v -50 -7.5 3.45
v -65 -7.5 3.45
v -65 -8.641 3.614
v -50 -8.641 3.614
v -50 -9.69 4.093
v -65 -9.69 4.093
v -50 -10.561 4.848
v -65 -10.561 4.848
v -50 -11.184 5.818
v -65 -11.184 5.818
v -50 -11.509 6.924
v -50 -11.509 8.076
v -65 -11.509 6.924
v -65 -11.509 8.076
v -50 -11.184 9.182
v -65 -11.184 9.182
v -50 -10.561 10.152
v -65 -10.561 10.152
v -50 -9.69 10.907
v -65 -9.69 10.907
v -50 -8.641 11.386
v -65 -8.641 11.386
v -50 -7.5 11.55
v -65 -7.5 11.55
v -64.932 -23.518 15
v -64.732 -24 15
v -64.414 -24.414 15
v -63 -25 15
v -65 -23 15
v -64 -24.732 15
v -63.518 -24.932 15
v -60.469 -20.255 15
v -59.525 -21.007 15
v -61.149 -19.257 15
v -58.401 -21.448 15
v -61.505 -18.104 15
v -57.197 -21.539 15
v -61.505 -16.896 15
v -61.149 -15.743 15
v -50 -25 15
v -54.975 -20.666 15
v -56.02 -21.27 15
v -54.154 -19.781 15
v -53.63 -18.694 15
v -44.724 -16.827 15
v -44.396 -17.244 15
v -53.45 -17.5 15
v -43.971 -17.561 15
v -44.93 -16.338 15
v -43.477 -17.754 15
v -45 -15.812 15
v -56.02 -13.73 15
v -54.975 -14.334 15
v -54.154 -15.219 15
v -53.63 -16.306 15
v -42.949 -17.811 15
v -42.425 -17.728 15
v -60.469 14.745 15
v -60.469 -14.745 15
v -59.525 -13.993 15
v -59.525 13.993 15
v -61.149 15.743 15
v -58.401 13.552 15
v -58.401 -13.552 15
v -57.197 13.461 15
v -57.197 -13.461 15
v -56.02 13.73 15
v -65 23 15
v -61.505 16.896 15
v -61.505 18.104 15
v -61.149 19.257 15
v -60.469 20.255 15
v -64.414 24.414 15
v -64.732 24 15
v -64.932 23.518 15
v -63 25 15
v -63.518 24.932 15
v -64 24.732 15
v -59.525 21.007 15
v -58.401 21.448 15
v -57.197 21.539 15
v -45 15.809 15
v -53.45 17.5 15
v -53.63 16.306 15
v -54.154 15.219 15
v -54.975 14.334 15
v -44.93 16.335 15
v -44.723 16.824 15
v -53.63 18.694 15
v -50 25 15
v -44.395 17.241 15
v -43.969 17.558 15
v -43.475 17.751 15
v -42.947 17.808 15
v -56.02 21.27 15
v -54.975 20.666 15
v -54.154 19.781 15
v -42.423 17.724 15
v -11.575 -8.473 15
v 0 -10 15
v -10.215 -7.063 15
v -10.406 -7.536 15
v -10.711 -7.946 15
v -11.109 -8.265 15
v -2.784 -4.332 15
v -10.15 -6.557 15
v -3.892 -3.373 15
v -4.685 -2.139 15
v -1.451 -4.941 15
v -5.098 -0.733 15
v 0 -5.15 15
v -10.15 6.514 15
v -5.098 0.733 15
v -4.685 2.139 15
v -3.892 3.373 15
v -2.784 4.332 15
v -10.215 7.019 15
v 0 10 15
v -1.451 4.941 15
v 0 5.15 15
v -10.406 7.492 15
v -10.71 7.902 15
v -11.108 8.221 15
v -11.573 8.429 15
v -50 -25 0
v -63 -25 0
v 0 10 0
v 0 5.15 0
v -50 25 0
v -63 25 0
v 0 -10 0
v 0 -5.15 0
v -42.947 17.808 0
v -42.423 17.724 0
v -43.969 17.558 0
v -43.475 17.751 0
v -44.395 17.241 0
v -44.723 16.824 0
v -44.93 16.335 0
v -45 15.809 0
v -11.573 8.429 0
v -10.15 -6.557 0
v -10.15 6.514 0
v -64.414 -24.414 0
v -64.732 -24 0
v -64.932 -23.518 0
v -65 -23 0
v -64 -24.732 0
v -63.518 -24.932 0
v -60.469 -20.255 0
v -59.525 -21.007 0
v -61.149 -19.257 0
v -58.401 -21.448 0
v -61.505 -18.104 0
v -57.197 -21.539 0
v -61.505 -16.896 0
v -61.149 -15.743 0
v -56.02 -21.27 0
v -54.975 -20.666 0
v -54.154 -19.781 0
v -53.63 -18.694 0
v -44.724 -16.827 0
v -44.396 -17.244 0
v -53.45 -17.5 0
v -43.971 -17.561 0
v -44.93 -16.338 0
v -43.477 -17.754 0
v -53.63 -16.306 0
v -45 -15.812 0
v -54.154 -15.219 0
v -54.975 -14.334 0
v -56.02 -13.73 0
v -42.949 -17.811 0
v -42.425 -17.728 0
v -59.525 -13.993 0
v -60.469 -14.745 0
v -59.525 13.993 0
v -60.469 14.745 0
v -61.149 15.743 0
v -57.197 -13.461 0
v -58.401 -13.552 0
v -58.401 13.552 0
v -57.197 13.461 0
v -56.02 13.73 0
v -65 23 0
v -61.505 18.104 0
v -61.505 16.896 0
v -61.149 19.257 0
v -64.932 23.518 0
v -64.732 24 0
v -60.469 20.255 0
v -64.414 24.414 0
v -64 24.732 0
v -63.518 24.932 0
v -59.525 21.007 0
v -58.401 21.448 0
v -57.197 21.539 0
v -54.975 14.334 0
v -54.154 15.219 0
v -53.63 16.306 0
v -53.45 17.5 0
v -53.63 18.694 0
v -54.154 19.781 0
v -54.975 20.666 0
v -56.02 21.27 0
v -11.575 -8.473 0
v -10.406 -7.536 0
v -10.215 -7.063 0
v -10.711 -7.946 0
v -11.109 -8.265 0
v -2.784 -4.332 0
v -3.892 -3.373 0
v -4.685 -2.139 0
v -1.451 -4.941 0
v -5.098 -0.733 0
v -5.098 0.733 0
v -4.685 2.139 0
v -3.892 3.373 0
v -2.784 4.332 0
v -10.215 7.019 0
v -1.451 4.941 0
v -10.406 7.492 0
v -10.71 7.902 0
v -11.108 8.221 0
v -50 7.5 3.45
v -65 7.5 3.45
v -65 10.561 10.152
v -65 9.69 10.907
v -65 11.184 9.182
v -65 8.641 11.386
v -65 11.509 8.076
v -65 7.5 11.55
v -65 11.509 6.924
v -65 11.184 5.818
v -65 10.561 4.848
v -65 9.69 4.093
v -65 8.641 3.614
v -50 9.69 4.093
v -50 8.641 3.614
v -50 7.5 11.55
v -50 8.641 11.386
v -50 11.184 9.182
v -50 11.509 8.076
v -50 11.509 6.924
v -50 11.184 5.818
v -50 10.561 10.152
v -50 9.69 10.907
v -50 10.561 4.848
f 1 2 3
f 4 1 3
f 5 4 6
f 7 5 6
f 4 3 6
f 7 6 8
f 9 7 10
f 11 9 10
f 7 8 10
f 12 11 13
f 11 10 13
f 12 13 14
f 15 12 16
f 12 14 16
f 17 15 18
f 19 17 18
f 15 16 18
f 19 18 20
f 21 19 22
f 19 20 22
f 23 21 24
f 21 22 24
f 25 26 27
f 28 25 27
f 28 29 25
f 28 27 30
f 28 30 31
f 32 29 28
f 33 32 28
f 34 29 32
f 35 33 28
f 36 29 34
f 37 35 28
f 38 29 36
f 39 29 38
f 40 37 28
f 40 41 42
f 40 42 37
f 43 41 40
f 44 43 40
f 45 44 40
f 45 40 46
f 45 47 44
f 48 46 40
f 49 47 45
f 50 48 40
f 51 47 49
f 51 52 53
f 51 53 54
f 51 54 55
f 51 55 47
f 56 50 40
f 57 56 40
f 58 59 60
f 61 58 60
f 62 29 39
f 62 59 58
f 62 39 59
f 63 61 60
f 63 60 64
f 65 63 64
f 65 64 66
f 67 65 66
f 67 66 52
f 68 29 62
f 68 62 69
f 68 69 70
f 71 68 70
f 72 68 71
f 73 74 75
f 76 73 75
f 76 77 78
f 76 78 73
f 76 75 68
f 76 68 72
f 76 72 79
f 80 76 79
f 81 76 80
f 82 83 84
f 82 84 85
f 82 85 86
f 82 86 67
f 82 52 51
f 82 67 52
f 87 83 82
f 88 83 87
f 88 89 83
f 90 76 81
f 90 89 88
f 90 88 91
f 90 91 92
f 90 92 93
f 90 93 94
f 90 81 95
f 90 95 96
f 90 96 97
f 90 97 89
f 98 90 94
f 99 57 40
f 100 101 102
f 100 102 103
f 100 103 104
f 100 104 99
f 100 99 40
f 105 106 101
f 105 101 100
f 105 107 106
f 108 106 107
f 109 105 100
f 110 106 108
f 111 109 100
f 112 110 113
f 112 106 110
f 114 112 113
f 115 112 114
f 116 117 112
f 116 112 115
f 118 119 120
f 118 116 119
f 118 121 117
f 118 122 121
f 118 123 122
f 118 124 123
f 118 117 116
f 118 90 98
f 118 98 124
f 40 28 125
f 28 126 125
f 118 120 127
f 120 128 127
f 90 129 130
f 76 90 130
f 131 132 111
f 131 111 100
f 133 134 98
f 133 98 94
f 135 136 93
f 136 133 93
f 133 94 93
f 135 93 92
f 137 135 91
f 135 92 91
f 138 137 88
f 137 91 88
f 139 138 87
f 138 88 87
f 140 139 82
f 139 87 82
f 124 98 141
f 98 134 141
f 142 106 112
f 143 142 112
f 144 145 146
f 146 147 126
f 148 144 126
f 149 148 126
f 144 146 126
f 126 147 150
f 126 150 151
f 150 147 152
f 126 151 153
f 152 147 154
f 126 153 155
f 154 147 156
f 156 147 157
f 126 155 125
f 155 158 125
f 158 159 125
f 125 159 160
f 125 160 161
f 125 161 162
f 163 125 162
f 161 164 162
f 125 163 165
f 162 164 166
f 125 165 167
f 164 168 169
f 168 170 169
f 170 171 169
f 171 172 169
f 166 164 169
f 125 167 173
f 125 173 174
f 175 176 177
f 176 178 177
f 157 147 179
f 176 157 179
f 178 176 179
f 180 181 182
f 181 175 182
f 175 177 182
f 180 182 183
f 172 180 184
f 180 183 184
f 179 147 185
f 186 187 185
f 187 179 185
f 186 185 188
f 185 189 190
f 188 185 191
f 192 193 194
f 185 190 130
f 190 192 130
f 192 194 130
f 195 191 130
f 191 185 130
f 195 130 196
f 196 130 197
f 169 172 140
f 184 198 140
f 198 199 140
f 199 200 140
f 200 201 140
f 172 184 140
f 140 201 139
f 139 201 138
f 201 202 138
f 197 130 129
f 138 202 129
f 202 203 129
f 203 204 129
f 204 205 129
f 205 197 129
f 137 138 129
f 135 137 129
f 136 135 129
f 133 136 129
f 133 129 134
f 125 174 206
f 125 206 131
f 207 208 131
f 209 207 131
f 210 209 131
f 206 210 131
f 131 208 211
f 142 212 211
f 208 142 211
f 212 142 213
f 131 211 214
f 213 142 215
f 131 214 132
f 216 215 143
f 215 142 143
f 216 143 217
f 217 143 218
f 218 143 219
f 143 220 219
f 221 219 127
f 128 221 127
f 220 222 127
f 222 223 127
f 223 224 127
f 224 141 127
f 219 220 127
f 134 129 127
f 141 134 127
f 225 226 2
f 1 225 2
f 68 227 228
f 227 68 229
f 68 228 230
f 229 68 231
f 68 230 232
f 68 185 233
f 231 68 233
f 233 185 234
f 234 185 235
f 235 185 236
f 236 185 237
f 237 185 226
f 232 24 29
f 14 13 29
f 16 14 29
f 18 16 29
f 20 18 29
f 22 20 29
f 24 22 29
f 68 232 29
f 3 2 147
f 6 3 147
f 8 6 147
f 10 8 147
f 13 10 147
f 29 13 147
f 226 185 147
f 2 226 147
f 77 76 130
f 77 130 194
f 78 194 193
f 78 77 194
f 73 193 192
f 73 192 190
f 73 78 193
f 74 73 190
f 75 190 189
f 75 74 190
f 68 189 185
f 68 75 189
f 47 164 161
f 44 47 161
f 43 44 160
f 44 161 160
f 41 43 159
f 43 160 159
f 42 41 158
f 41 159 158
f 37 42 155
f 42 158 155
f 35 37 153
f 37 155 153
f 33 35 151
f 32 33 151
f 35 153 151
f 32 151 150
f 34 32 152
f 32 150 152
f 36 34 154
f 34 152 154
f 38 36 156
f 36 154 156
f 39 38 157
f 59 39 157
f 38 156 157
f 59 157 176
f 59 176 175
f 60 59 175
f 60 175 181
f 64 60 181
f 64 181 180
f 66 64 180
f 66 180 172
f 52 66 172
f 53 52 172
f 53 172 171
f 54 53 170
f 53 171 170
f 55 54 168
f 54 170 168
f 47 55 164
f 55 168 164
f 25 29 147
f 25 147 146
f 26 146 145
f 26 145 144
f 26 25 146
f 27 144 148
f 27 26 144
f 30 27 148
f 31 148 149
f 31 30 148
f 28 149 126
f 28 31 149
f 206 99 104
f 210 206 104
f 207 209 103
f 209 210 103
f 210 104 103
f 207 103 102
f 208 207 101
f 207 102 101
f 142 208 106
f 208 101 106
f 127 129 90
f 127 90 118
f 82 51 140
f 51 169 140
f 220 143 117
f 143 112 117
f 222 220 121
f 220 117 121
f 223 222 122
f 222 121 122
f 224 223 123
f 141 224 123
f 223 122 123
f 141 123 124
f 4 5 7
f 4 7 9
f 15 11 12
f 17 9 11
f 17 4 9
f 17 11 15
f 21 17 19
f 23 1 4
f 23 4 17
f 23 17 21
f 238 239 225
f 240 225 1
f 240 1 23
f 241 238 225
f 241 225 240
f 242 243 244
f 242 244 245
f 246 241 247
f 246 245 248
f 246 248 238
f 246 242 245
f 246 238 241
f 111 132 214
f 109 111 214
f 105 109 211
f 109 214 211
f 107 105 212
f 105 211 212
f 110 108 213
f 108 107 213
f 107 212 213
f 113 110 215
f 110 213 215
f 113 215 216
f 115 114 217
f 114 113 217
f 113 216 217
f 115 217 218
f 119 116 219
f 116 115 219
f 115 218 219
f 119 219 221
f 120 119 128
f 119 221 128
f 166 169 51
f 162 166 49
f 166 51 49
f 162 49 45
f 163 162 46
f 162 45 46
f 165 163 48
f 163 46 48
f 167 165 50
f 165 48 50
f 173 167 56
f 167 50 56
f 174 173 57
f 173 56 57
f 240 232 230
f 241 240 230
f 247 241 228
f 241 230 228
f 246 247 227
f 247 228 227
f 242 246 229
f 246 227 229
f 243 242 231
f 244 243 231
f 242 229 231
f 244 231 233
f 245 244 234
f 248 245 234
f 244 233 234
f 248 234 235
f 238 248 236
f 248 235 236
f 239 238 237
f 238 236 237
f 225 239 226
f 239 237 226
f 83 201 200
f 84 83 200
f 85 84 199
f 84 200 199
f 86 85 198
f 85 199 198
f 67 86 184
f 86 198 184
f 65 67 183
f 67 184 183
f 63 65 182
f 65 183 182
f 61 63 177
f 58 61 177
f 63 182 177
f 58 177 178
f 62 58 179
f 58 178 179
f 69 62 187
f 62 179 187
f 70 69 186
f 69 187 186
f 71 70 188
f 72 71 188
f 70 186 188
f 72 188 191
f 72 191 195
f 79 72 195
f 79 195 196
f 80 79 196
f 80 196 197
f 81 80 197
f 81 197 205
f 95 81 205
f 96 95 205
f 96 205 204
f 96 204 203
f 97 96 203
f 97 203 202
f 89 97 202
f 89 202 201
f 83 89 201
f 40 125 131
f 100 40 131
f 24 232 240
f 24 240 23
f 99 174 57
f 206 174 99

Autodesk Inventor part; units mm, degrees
ref_plane "YZ Plane" through (0, 0, 0) normal (1, 0, 0) x (0, 1, 0)
ref_plane "XZ Plane" through (0, 0, 0) normal (0, 1, 0) x (-1, 0, 0)
ref_plane "XY Plane" through (0, 0, 0) normal (0, 0, 1) x (1, 0, 0)
sketch "Sketch1" plane through (0, 0, 0) normal (0, 0, 1) x (1, 0, 0)
  arc A0 (0, 5.15) -> (0, -5.15) centre (0, 0) ccw
  line L0 (0, 5.15) -> (0, 10)
  line L1 (0, -5.15) -> (0, -10)
  line L2 (0, 0) -> (-50, 0)
  line L3 (-50, 0) -> (-50, 25)
  line L4 (-50, 0) -> (-50, -25)
  line L5 (-50, -25) -> (0, -10)
  line L6 (-50, 25) -> (0, 10)
  line L7 (-50, 25) -> (-65, 25)
  line L8 (-65, 25) -> (-65, -25)
  line L9 (-65, -25) -> (-50, -25)
  line L10 (-50, 0) -> (-45, 0)
  line L11 (-45, 0) -> (-45, 23.5)
  line L12 (-45, 0) -> (-45, -23.5)
  line L13 (-5.15, 0) -> (-10.15, 0)
  line L14 (-10.15, 0) -> (-10.15, 13.045)
  line L15 (-10.15, 0) -> (-10.15, -13.045)
  line L16 (-45, -23.5) -> (-45, -18.5)
  line L17 (-45, -18.5) -> (-10.15, -8.045)
  line L18 (-45, 23.5) -> (-45, 18.5)
  line L19 (-45, 18.5) -> (-10.15, 8)
  line L20 (-57.5, 25) -> (-57.5, -25)
  line L21 (-65, 0) -> (-50, 0)
  line L22 (-65, 25) -> (-50, 10)
  line L23 (-65, 25) -> (-43.7868, 25) construction
  line L24 (-65, -25) -> (-50, -10)
  line L25 (-65, -25) -> (-43.7868, -25) construction
  circle A1 centre (-57.5, -17.5) radius 4.05
  circle A2 centre (-57.5, 17.5) radius 4.05
  dimension "d0" = 10.3
  dimension "d3" = 50
  dimension "d4" = 25
  dimension "d5" = 25
  dimension "d6" = 15
  dimension "d7" = 50
  dimension "d8" = 90
  dimension "d9" = 5
  dimension "d10" = 5
  dimension "d11" = 5
  dimension "d12" = 5
  dimension "d13" = 45
  dimension "d14" = 45
  dimension "d15" = 8.1
  dimension "d16" = 8.1
  dimension "d26" = 50
  dimension "d27" = 10
  dimension "d28" = 20
extrude "Extrusion1" add sketch "Sketch1" along normal blind 15 contours A0 L2 L14 L6 L0 | A0 L1 L5 L15 L2 | L14 L19 L11 L6 | L12 L5 L4 L2 | L2 L3 L6 L11 | L15 L5 L12 L17 | L21 L20 A2 L22 L3 | L4 L24 A1 L20 L21 | L3 L22 A2 L20 L7 | L4 L9 L20 A1 L24 | L21 L8 L22 A2 L20 | L20 A1 L24 L8 L21 | L20 A2 L22 L7 | L9 L24 A1 L20
sketch "Sketch2" plane through (-65, -25, 0) normal (-1, 0, 0) x (0, 0, 1)
  line L0 (0, 50) -> (0, 0) projected
  line L1 (0, 0) -> (15, 0) projected
  line L2 (15, 50) -> (15, 0) projected
  line L3 (0, 50) -> (15, 50) projected
  line L4 (0, 25) -> (15, 25)
  line L5 (7.5, 25) -> (7.5, 17.5)
  line L6 (7.5, 25) -> (7.5, 32.5)
  circle A0 centre (7.5, 32.5) radius 4.05
  circle A1 centre (7.5, 17.5) radius 4.05
  line L7 (7.5, 32.5) -> (11.55, 32.5)
  line L8 (11.55, 32.5) -> (11.55, 17.5)
  line L9 (7.5, 32.5) -> (3.45, 32.5)
  line L10 (3.45, 32.5) -> (3.45, 17.5)
  dimension "d19" = 7.5
  dimension "d20" = 7.5
  dimension "d21" = 8.1
  dimension "d22" = 8.1
extrude "Extrusion2" cut sketch "Sketch2" against normal up to surface (15 mm away) contours L10 A0 L6 L4 | L4 L5 A1 L10 | L6 A0 L8 L4 | L4 L8 A1 L5 | L9 L6 A0 | A0 L7 L9 | A1 | L6 L7 A0
fillet "Fillet1" radius 2 4 edges at (-45, -18.5, 7.5) (-10.15, -8.045, 7.5) (-45, 18.5, 7.5) (-10.15, 8, 7.5)
fillet "Fillet2" radius 2 2 edges at (-65, -25, 7.5) (-65, 25, 7.5)
properties part number "Rod_support_1"
